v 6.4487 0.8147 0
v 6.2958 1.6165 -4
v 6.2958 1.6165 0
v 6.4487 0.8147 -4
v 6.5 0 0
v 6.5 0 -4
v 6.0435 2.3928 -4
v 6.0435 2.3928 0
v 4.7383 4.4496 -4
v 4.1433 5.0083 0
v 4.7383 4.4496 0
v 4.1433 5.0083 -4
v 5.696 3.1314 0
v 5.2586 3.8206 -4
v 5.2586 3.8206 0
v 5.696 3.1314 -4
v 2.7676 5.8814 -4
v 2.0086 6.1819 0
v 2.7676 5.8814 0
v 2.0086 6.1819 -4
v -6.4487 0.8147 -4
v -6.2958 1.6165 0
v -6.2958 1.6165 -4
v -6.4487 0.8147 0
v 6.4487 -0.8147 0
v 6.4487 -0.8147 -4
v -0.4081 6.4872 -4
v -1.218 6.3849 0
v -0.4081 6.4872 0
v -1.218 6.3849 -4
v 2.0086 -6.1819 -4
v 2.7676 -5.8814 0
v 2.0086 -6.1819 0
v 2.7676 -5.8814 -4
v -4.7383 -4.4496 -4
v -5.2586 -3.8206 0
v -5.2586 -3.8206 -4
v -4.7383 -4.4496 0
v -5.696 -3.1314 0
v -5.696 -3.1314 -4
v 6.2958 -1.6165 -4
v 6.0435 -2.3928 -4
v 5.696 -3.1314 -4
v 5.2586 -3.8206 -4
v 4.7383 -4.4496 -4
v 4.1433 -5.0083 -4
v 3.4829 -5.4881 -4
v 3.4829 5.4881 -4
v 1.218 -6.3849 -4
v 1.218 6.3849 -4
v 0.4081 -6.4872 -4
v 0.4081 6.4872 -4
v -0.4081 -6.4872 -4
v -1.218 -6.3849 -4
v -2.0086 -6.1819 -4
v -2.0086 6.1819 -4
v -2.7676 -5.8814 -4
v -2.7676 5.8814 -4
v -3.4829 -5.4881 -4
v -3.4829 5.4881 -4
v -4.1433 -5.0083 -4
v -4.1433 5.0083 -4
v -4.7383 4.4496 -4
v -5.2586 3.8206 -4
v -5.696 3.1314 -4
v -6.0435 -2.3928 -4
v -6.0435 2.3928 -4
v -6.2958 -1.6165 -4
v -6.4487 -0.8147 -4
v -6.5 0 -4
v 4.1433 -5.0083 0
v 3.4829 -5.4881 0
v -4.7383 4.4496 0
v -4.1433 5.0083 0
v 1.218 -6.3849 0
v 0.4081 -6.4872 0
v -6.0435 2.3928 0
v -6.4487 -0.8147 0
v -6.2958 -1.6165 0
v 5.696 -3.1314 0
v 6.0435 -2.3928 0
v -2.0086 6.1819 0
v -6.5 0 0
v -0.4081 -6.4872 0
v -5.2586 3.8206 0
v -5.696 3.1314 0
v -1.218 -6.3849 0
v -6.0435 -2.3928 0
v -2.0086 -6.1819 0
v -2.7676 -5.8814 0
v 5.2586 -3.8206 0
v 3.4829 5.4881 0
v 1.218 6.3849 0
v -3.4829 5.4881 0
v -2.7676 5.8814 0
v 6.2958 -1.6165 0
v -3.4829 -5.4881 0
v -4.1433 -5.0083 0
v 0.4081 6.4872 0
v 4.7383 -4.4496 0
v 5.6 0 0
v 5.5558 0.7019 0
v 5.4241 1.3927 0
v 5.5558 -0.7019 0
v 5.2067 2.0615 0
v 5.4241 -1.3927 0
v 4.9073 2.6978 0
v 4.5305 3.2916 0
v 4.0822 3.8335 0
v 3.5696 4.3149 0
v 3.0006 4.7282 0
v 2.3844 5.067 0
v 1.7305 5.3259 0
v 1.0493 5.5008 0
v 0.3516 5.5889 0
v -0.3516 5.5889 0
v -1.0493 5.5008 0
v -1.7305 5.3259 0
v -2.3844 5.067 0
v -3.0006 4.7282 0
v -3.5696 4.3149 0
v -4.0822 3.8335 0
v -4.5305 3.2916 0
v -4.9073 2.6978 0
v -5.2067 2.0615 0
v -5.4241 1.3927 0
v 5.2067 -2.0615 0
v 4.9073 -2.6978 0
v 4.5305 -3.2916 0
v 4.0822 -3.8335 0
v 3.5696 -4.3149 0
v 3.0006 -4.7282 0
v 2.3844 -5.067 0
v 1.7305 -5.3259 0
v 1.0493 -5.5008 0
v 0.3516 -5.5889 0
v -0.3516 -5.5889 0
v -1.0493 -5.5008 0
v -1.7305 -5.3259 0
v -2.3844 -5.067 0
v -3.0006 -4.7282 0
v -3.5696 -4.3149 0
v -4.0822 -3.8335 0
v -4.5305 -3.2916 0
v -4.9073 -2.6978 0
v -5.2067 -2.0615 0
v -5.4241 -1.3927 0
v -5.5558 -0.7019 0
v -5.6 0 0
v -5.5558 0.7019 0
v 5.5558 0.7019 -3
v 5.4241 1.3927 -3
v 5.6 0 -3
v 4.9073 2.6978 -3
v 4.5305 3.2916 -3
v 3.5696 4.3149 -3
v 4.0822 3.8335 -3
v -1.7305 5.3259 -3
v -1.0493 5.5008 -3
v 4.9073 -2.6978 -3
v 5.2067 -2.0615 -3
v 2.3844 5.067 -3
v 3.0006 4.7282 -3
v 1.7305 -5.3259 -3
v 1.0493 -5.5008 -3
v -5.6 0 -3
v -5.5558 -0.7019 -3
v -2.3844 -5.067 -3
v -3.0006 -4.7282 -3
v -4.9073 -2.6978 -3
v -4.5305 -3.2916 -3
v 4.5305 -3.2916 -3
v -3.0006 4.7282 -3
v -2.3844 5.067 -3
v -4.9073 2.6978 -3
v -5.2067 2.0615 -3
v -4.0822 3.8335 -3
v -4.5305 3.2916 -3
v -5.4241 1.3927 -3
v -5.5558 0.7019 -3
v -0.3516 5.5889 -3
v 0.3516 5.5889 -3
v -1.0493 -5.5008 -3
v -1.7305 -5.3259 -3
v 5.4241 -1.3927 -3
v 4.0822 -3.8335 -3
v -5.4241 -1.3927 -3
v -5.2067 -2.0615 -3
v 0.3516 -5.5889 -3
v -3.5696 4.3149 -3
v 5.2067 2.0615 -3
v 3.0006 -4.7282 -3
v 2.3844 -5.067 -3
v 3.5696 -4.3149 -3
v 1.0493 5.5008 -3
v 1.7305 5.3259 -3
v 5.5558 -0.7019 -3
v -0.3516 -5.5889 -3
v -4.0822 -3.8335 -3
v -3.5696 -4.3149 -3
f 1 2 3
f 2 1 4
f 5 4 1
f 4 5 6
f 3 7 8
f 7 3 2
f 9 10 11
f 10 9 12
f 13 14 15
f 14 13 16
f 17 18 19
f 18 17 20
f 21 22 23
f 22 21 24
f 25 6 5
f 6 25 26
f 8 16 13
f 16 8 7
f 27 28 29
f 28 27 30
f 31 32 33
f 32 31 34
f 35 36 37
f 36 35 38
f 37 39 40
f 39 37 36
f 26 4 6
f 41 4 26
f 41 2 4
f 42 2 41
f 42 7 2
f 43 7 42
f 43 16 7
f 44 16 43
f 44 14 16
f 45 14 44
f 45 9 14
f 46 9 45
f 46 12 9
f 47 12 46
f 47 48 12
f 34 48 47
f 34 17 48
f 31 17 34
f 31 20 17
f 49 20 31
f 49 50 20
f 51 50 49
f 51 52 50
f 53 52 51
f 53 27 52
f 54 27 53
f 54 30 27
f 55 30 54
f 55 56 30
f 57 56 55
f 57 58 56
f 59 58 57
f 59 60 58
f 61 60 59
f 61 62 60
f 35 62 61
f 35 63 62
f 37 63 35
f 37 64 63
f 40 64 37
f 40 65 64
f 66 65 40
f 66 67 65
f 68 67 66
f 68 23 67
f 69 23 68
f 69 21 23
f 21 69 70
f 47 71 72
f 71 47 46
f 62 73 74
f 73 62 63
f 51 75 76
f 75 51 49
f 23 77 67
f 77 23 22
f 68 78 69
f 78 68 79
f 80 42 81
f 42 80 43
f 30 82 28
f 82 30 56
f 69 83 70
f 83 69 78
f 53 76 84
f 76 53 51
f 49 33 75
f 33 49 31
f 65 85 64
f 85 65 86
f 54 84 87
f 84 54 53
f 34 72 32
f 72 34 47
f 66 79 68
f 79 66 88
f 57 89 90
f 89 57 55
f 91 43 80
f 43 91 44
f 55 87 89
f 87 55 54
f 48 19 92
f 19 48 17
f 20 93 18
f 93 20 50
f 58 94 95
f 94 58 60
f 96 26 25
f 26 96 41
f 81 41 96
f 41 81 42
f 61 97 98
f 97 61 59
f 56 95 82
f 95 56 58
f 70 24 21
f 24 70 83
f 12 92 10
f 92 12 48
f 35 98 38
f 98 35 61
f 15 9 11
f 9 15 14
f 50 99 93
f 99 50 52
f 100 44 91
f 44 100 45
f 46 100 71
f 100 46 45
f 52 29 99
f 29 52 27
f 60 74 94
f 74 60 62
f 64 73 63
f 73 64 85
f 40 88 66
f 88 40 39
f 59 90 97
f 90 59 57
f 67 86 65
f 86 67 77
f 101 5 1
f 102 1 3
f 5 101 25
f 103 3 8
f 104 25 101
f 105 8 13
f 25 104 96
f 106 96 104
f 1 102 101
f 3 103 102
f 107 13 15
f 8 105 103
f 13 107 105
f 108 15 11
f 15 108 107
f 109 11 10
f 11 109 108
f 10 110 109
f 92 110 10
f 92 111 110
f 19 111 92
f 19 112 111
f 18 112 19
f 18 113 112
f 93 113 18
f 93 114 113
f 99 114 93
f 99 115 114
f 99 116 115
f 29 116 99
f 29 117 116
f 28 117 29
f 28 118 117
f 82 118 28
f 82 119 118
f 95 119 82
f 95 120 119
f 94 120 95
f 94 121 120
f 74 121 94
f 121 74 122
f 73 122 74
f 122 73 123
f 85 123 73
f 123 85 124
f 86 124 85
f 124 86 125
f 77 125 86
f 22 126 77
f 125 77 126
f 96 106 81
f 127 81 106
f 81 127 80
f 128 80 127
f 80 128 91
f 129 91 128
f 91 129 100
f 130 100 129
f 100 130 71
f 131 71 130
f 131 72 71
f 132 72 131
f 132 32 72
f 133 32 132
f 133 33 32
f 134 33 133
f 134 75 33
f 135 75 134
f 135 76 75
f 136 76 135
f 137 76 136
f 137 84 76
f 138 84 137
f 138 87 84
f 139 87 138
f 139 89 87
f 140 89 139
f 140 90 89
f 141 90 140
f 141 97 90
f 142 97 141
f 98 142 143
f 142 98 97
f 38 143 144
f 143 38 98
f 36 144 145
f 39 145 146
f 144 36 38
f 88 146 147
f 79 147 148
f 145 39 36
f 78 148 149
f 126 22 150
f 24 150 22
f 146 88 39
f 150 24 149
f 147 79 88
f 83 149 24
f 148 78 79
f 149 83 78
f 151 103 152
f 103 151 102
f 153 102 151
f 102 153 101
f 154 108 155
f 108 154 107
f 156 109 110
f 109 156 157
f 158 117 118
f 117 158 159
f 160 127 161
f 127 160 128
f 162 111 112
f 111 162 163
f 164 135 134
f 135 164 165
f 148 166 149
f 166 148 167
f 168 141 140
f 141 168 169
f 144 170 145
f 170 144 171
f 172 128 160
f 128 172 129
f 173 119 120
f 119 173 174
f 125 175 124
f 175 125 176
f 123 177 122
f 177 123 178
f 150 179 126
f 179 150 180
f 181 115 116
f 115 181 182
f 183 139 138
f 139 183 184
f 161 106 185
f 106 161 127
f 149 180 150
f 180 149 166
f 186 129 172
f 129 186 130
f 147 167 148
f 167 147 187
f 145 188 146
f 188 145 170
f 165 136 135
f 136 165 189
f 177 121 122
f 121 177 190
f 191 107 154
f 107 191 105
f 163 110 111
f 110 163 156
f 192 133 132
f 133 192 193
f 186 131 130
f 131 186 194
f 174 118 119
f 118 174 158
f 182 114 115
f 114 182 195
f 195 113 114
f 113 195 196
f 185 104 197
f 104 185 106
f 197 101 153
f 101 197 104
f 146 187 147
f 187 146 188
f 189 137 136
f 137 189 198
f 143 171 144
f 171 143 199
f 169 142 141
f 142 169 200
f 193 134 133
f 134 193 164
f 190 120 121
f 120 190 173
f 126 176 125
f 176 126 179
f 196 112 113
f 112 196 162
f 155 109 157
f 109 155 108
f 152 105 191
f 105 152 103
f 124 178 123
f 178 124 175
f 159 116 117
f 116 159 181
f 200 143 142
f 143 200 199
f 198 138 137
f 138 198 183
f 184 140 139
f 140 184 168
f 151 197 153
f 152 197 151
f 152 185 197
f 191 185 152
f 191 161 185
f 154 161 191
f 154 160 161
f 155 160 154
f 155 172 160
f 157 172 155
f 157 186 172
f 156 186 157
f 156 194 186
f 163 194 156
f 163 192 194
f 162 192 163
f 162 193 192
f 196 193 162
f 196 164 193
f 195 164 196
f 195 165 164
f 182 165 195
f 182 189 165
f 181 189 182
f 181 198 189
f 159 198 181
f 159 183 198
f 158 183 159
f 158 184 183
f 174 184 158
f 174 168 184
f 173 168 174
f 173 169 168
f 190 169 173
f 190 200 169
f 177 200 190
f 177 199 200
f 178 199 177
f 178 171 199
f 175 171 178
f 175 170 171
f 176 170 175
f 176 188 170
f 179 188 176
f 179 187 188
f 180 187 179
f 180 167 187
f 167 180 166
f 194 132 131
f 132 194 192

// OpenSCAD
$fn = 50;


difference() {
	union() {
		translate(v = [0, 0, -4.0000000000]) {
			cylinder(h = 4, r = 6.5000000000);
		}
	}
	union() {
		#translate(v = [0, 0, -3.0000000000]) {
			cylinder(h = 3, r = 5.6000000000);
		}
	}
}
